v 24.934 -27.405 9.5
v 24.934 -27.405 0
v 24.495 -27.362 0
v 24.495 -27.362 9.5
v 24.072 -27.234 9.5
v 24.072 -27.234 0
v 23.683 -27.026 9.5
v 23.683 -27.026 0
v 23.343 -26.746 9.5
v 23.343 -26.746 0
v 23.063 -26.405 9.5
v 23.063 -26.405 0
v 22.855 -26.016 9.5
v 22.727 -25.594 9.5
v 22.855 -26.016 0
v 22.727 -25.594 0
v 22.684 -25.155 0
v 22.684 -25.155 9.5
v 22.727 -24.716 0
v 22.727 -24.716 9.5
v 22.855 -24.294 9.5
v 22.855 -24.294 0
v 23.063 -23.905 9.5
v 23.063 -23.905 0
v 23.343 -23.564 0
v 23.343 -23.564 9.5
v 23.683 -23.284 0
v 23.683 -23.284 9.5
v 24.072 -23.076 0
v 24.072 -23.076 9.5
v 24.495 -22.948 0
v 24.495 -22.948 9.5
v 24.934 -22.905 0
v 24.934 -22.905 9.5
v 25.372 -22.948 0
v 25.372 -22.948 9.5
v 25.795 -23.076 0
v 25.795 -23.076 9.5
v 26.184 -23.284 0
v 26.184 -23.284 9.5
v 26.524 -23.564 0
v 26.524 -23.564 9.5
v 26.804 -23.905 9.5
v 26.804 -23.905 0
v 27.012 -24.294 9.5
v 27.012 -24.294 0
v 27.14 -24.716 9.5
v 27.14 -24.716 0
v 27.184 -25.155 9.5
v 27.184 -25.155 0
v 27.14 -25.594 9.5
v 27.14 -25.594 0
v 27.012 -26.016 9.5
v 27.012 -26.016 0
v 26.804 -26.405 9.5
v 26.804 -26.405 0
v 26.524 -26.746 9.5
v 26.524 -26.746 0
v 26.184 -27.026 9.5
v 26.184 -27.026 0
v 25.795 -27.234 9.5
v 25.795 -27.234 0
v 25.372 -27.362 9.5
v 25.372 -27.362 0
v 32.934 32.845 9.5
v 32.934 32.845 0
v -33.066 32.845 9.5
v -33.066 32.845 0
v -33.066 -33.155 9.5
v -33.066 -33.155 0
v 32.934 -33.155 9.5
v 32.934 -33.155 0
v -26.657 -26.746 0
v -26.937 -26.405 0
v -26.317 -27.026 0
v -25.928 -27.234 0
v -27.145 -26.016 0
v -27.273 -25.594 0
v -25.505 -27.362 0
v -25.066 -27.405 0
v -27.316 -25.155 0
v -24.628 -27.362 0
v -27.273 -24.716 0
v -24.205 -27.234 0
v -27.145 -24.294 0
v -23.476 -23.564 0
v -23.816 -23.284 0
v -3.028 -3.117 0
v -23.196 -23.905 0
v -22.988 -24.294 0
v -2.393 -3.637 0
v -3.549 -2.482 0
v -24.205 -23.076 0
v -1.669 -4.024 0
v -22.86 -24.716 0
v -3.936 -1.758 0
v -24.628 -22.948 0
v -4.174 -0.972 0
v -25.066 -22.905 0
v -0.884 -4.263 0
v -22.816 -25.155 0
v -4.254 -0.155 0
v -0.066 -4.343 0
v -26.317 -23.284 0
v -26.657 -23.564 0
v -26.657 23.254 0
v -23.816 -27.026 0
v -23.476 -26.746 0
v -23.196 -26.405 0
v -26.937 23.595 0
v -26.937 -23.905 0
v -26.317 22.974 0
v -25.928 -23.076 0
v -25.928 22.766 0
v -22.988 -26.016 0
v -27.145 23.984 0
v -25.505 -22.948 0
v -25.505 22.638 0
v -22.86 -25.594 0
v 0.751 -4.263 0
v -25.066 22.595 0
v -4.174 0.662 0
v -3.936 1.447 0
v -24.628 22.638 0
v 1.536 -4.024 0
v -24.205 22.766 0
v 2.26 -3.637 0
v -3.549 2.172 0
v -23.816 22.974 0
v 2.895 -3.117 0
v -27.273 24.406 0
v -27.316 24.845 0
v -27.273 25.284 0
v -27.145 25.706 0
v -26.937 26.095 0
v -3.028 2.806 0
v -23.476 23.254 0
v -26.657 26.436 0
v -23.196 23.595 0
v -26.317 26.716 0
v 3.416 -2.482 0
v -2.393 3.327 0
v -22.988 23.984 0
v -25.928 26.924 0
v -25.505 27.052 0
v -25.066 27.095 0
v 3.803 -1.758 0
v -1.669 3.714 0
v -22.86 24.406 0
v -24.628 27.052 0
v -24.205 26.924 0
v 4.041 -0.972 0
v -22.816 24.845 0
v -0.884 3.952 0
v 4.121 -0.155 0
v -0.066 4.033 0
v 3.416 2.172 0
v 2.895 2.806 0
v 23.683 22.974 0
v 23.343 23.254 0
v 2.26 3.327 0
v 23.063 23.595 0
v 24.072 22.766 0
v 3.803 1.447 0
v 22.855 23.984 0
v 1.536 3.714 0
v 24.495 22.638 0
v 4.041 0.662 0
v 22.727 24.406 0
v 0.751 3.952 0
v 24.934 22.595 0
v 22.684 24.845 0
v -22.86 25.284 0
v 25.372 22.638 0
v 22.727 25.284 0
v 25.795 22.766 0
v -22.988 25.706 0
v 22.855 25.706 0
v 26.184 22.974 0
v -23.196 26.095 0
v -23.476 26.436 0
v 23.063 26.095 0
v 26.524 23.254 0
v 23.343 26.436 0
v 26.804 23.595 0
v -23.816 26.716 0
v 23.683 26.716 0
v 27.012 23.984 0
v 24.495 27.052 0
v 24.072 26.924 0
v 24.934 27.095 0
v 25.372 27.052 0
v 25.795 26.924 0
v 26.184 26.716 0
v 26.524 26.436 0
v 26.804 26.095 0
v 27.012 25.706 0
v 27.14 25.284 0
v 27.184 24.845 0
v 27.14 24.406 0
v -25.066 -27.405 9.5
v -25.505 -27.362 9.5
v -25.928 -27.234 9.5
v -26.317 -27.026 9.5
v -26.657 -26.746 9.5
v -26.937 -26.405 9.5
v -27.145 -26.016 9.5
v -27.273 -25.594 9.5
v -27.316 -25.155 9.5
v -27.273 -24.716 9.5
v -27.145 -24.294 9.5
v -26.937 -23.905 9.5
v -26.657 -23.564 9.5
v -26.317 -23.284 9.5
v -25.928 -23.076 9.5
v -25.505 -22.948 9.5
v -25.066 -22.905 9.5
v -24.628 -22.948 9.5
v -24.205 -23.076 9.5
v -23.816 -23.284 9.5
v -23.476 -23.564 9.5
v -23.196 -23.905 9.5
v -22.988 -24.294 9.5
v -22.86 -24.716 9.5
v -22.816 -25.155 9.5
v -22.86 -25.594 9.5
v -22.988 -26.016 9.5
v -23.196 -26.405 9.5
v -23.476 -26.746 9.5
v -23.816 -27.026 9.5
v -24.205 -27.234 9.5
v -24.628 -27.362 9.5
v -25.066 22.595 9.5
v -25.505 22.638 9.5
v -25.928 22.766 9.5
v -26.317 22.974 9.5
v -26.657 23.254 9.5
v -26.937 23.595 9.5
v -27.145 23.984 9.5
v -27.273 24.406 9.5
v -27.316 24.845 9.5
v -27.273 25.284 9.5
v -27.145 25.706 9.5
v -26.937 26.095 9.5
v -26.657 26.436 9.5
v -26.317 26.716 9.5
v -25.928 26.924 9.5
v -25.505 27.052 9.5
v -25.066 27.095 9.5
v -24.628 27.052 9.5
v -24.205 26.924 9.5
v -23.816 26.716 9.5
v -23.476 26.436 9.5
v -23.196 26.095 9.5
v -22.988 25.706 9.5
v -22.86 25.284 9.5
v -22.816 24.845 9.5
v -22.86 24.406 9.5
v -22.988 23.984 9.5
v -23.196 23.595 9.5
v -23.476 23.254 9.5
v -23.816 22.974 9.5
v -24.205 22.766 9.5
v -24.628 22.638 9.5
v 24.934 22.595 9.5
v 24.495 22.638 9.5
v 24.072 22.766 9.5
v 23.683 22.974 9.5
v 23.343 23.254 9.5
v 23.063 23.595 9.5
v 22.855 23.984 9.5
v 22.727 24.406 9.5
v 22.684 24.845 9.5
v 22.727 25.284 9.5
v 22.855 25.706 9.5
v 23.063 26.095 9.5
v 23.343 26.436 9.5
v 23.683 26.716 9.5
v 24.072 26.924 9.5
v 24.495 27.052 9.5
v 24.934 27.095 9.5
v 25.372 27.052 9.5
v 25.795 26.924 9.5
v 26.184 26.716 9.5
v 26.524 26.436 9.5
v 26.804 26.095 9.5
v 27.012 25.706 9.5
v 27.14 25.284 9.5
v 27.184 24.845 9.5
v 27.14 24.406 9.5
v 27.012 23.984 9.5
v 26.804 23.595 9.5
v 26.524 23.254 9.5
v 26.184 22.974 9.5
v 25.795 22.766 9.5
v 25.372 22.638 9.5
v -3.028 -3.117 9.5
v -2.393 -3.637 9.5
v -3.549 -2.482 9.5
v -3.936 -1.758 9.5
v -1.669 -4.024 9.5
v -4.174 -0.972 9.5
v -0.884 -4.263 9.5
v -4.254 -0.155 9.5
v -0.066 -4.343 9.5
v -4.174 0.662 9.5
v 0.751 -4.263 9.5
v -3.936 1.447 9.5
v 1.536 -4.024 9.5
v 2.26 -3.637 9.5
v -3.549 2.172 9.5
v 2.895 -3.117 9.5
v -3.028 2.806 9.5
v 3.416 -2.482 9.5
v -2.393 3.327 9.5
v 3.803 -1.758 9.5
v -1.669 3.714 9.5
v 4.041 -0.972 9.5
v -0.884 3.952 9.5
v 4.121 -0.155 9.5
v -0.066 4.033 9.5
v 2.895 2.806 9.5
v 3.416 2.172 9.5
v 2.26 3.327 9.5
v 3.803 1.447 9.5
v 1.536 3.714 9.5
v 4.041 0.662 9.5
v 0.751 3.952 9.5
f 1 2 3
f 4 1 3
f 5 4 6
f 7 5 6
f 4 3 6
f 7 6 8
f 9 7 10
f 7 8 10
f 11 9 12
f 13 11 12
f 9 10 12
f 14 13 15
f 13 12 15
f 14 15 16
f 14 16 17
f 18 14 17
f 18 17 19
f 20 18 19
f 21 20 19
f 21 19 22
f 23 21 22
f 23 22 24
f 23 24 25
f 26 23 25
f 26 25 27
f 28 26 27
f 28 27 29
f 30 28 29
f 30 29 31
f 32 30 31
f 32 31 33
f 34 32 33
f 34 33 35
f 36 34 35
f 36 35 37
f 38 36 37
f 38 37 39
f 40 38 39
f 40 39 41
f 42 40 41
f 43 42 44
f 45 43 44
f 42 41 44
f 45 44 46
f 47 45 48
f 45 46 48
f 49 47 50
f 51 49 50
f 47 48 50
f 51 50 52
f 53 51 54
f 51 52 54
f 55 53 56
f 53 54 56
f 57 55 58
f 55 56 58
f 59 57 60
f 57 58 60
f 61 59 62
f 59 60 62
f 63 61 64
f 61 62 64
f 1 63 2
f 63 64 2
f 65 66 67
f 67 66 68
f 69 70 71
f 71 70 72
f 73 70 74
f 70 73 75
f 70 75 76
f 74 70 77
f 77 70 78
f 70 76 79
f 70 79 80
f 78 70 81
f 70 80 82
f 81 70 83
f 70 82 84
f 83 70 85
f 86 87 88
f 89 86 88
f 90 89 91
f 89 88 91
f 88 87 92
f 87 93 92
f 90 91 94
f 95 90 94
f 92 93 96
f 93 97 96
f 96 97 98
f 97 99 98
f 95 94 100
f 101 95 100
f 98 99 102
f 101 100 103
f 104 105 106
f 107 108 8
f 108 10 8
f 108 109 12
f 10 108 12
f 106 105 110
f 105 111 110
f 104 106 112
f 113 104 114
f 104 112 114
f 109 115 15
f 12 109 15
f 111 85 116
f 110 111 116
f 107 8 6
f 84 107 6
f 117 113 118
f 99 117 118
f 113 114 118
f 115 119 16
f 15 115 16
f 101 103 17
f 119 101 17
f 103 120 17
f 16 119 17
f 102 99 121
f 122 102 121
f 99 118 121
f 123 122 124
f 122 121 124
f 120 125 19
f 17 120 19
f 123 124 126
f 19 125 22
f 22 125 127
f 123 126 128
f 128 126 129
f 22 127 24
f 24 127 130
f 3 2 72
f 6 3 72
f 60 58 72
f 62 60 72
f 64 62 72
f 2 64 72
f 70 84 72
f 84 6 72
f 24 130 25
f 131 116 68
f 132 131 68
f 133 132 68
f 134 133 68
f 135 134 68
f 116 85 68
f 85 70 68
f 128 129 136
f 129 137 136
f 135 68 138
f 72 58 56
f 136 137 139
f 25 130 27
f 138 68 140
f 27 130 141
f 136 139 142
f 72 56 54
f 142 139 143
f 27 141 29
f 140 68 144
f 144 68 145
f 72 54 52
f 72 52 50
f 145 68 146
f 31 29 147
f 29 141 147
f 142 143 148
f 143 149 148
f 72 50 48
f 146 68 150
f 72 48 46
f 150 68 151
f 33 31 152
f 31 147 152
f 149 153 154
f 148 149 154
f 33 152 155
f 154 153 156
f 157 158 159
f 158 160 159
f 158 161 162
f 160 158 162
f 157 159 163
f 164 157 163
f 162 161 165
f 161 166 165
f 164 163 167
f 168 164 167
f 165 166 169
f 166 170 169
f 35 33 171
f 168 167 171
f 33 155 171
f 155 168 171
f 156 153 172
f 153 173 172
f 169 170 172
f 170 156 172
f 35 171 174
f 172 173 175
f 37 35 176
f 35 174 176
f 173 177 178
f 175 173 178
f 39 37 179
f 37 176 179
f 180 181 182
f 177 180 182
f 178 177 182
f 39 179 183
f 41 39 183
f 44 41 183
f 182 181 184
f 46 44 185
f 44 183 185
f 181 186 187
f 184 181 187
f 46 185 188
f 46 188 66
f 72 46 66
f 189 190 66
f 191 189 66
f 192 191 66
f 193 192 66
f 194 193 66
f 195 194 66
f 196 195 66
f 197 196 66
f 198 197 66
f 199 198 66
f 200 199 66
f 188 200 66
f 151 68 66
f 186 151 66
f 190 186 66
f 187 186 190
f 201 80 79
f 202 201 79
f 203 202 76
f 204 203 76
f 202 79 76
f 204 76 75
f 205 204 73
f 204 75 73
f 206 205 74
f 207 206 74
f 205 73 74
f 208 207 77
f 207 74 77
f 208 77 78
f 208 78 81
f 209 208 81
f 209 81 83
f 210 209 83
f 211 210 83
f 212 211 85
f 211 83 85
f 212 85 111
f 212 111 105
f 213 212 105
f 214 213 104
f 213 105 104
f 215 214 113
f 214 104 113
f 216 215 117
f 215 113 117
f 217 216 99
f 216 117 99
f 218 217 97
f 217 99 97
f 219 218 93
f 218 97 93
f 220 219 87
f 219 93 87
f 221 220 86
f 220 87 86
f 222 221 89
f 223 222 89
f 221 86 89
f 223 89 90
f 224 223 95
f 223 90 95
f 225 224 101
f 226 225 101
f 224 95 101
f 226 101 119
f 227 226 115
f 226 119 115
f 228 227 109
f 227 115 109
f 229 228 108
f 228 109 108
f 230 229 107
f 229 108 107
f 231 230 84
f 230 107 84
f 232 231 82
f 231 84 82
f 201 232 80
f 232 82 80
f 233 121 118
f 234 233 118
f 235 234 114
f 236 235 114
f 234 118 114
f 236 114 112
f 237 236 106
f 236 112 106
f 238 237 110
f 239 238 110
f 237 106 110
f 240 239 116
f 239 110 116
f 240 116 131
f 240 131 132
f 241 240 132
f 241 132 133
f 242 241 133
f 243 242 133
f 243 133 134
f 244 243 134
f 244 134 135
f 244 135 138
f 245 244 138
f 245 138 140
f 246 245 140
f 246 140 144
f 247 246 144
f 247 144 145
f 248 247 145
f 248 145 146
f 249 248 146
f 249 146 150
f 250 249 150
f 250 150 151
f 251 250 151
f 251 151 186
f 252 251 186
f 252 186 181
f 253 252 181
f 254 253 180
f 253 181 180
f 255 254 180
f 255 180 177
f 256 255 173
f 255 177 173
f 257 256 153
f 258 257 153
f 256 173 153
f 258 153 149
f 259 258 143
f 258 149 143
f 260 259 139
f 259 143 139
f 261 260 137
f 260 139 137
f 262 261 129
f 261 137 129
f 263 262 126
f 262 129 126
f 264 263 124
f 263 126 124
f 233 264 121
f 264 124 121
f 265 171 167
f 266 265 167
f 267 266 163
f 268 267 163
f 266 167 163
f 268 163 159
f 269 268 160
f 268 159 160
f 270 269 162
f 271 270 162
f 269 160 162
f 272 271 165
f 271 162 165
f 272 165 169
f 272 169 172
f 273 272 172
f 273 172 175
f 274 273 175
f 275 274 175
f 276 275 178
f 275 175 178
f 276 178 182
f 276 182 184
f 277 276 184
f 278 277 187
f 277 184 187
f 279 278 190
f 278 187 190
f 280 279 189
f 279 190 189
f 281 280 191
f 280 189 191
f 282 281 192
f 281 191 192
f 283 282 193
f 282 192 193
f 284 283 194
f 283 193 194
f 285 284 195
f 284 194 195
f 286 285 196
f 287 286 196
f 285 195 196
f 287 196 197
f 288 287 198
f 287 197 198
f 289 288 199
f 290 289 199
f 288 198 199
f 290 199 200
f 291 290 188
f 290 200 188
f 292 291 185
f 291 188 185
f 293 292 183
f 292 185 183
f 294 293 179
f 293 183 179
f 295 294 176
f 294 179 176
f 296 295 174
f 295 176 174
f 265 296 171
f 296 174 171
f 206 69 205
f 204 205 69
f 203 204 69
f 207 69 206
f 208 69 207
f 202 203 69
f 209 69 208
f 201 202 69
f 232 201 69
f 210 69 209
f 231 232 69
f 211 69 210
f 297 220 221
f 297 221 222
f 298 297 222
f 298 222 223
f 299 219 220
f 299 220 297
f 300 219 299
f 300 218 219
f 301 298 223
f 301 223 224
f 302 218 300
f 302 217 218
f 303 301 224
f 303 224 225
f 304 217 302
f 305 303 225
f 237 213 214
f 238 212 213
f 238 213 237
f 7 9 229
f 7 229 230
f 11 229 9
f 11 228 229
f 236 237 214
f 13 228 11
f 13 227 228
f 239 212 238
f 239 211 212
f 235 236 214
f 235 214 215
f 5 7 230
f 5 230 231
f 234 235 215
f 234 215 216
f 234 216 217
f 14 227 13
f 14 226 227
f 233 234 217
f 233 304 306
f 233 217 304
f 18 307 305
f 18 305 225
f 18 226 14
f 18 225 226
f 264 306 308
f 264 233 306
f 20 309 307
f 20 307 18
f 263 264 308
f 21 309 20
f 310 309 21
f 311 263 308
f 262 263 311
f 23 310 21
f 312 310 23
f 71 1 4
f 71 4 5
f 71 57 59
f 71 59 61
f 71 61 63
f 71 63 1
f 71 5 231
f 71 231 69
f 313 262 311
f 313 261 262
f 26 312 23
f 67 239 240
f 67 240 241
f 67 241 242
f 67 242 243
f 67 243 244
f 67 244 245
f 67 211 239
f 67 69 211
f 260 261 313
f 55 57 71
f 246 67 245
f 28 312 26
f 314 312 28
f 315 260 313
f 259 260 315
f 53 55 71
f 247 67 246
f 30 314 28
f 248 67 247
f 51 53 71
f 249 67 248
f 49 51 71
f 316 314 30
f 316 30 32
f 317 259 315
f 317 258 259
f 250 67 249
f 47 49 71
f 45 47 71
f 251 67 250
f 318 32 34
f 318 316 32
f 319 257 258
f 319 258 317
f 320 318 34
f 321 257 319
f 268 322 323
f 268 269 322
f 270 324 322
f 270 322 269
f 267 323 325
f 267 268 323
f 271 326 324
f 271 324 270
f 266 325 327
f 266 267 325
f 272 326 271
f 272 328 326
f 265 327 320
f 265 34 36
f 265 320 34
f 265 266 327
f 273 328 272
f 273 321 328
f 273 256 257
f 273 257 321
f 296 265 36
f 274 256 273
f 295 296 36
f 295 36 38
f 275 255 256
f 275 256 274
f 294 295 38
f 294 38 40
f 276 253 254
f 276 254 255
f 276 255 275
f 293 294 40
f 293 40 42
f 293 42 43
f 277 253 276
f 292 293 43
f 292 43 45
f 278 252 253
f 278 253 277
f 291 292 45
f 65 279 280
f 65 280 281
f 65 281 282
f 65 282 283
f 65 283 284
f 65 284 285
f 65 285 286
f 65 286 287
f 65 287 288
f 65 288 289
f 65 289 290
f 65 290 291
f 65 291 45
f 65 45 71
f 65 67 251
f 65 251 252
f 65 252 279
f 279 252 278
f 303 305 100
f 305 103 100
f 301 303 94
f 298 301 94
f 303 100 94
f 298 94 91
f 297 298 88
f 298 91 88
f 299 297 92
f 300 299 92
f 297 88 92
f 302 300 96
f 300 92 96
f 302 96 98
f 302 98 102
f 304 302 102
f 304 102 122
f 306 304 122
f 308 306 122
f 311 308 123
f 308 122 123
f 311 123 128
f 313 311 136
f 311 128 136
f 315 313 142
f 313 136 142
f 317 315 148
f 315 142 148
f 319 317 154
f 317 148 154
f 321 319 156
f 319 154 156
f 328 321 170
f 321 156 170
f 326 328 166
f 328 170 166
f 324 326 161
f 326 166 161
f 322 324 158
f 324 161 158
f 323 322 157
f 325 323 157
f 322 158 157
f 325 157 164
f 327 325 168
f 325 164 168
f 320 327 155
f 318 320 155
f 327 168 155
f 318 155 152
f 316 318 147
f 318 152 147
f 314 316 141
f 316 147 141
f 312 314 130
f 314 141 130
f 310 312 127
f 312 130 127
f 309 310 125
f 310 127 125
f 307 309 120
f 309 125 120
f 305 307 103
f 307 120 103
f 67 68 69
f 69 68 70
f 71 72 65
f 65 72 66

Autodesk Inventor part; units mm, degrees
ref_plane "YZ Plane" through (0, 0, 0) normal (1, 0, 0) x (0, 1, 0)
ref_plane "XZ Plane" through (0, 0, 0) normal (0, 1, 0) x (-1, 0, 0)
ref_plane "XY Plane" through (0, 0, 0) normal (0, 0, 1) x (1, 0, 0)
sketch "Esboço1" plane through (0, 0, 0) normal (0, 0, 1) x (1, 0, 0)
  circle A0 centre (-25.0665, 24.8448) radius 1.621
  circle A1 centre (24.9335, -25.1552) radius 1.621
  line L0 (-25.0665, 24.8448) -> (24.9335, -25.1552)
  line L1 (-33.0665, -33.1552) -> (32.9335, -33.1552)
  line L2 (32.9335, -33.1552) -> (32.9335, 32.8448)
  line L3 (32.9335, 32.8448) -> (-33.0665, 32.8448)
  line L4 (-33.0665, 32.8448) -> (-33.0665, -33.1552)
  line L5 (-33.0665, -33.1552) -> (32.9335, 32.8448) construction
  line L6 (32.9335, -33.1552) -> (-33.0665, 32.8448) construction
  circle A2 centre (-0.0665, -0.1552) radius 2.5192
  circle A3 centre (24.9335, 24.8448) radius 1.621
  circle A4 centre (-25.0665, -25.1552) radius 1.621
  point P0 (0, 0)
  dimension "d0" = 66
  dimension "d1" = 66
extrude "Extrusão1" add sketch "Esboço1" along normal blind 9.5
sketch "Esboço2" plane through (0, 0, 9.5) normal (0, 0, 1) x (1, 0, 0)
  circle A0 centre (24.9335, 24.8448) radius 1.621 projected
  circle A1 centre (-25.0665, 24.8448) radius 1.621 projected
  circle A2 centre (-25.0665, -25.1552) radius 1.621 projected
  circle A3 centre (24.9335, -25.1552) radius 1.621 projected
  point P0 (0, 0)
hole "Furo1" at (24.9335, 24.8448, 9.5) at (-25.0665, 24.8448, 9.5) at (-25.0665, -25.1552, 9.5) at (24.9335, -25.1552, 9.5) direction (0, 0, -1) diameter 4.5 end through all clearance for "Countersunk Flat Head Screw ISO 2009/7046" size "M4" standard "ISO"
sketch "Esboço3" plane through (0, 0, 9.5) normal (0, 0, 1) x (1, 0, 0)
  circle A0 centre (-0.0665, -0.1552) radius 2.5192 projected
  point P0 (0, 0)
hole "Furo2" at (-0.0665, -0.1552, 9.5) direction (0, 0, -1) diameter 8.376 end through all thread size "M10x1.5" class "6H" standard "ISO Metric profile"
properties part number "Acoplador do pé nivelador"
